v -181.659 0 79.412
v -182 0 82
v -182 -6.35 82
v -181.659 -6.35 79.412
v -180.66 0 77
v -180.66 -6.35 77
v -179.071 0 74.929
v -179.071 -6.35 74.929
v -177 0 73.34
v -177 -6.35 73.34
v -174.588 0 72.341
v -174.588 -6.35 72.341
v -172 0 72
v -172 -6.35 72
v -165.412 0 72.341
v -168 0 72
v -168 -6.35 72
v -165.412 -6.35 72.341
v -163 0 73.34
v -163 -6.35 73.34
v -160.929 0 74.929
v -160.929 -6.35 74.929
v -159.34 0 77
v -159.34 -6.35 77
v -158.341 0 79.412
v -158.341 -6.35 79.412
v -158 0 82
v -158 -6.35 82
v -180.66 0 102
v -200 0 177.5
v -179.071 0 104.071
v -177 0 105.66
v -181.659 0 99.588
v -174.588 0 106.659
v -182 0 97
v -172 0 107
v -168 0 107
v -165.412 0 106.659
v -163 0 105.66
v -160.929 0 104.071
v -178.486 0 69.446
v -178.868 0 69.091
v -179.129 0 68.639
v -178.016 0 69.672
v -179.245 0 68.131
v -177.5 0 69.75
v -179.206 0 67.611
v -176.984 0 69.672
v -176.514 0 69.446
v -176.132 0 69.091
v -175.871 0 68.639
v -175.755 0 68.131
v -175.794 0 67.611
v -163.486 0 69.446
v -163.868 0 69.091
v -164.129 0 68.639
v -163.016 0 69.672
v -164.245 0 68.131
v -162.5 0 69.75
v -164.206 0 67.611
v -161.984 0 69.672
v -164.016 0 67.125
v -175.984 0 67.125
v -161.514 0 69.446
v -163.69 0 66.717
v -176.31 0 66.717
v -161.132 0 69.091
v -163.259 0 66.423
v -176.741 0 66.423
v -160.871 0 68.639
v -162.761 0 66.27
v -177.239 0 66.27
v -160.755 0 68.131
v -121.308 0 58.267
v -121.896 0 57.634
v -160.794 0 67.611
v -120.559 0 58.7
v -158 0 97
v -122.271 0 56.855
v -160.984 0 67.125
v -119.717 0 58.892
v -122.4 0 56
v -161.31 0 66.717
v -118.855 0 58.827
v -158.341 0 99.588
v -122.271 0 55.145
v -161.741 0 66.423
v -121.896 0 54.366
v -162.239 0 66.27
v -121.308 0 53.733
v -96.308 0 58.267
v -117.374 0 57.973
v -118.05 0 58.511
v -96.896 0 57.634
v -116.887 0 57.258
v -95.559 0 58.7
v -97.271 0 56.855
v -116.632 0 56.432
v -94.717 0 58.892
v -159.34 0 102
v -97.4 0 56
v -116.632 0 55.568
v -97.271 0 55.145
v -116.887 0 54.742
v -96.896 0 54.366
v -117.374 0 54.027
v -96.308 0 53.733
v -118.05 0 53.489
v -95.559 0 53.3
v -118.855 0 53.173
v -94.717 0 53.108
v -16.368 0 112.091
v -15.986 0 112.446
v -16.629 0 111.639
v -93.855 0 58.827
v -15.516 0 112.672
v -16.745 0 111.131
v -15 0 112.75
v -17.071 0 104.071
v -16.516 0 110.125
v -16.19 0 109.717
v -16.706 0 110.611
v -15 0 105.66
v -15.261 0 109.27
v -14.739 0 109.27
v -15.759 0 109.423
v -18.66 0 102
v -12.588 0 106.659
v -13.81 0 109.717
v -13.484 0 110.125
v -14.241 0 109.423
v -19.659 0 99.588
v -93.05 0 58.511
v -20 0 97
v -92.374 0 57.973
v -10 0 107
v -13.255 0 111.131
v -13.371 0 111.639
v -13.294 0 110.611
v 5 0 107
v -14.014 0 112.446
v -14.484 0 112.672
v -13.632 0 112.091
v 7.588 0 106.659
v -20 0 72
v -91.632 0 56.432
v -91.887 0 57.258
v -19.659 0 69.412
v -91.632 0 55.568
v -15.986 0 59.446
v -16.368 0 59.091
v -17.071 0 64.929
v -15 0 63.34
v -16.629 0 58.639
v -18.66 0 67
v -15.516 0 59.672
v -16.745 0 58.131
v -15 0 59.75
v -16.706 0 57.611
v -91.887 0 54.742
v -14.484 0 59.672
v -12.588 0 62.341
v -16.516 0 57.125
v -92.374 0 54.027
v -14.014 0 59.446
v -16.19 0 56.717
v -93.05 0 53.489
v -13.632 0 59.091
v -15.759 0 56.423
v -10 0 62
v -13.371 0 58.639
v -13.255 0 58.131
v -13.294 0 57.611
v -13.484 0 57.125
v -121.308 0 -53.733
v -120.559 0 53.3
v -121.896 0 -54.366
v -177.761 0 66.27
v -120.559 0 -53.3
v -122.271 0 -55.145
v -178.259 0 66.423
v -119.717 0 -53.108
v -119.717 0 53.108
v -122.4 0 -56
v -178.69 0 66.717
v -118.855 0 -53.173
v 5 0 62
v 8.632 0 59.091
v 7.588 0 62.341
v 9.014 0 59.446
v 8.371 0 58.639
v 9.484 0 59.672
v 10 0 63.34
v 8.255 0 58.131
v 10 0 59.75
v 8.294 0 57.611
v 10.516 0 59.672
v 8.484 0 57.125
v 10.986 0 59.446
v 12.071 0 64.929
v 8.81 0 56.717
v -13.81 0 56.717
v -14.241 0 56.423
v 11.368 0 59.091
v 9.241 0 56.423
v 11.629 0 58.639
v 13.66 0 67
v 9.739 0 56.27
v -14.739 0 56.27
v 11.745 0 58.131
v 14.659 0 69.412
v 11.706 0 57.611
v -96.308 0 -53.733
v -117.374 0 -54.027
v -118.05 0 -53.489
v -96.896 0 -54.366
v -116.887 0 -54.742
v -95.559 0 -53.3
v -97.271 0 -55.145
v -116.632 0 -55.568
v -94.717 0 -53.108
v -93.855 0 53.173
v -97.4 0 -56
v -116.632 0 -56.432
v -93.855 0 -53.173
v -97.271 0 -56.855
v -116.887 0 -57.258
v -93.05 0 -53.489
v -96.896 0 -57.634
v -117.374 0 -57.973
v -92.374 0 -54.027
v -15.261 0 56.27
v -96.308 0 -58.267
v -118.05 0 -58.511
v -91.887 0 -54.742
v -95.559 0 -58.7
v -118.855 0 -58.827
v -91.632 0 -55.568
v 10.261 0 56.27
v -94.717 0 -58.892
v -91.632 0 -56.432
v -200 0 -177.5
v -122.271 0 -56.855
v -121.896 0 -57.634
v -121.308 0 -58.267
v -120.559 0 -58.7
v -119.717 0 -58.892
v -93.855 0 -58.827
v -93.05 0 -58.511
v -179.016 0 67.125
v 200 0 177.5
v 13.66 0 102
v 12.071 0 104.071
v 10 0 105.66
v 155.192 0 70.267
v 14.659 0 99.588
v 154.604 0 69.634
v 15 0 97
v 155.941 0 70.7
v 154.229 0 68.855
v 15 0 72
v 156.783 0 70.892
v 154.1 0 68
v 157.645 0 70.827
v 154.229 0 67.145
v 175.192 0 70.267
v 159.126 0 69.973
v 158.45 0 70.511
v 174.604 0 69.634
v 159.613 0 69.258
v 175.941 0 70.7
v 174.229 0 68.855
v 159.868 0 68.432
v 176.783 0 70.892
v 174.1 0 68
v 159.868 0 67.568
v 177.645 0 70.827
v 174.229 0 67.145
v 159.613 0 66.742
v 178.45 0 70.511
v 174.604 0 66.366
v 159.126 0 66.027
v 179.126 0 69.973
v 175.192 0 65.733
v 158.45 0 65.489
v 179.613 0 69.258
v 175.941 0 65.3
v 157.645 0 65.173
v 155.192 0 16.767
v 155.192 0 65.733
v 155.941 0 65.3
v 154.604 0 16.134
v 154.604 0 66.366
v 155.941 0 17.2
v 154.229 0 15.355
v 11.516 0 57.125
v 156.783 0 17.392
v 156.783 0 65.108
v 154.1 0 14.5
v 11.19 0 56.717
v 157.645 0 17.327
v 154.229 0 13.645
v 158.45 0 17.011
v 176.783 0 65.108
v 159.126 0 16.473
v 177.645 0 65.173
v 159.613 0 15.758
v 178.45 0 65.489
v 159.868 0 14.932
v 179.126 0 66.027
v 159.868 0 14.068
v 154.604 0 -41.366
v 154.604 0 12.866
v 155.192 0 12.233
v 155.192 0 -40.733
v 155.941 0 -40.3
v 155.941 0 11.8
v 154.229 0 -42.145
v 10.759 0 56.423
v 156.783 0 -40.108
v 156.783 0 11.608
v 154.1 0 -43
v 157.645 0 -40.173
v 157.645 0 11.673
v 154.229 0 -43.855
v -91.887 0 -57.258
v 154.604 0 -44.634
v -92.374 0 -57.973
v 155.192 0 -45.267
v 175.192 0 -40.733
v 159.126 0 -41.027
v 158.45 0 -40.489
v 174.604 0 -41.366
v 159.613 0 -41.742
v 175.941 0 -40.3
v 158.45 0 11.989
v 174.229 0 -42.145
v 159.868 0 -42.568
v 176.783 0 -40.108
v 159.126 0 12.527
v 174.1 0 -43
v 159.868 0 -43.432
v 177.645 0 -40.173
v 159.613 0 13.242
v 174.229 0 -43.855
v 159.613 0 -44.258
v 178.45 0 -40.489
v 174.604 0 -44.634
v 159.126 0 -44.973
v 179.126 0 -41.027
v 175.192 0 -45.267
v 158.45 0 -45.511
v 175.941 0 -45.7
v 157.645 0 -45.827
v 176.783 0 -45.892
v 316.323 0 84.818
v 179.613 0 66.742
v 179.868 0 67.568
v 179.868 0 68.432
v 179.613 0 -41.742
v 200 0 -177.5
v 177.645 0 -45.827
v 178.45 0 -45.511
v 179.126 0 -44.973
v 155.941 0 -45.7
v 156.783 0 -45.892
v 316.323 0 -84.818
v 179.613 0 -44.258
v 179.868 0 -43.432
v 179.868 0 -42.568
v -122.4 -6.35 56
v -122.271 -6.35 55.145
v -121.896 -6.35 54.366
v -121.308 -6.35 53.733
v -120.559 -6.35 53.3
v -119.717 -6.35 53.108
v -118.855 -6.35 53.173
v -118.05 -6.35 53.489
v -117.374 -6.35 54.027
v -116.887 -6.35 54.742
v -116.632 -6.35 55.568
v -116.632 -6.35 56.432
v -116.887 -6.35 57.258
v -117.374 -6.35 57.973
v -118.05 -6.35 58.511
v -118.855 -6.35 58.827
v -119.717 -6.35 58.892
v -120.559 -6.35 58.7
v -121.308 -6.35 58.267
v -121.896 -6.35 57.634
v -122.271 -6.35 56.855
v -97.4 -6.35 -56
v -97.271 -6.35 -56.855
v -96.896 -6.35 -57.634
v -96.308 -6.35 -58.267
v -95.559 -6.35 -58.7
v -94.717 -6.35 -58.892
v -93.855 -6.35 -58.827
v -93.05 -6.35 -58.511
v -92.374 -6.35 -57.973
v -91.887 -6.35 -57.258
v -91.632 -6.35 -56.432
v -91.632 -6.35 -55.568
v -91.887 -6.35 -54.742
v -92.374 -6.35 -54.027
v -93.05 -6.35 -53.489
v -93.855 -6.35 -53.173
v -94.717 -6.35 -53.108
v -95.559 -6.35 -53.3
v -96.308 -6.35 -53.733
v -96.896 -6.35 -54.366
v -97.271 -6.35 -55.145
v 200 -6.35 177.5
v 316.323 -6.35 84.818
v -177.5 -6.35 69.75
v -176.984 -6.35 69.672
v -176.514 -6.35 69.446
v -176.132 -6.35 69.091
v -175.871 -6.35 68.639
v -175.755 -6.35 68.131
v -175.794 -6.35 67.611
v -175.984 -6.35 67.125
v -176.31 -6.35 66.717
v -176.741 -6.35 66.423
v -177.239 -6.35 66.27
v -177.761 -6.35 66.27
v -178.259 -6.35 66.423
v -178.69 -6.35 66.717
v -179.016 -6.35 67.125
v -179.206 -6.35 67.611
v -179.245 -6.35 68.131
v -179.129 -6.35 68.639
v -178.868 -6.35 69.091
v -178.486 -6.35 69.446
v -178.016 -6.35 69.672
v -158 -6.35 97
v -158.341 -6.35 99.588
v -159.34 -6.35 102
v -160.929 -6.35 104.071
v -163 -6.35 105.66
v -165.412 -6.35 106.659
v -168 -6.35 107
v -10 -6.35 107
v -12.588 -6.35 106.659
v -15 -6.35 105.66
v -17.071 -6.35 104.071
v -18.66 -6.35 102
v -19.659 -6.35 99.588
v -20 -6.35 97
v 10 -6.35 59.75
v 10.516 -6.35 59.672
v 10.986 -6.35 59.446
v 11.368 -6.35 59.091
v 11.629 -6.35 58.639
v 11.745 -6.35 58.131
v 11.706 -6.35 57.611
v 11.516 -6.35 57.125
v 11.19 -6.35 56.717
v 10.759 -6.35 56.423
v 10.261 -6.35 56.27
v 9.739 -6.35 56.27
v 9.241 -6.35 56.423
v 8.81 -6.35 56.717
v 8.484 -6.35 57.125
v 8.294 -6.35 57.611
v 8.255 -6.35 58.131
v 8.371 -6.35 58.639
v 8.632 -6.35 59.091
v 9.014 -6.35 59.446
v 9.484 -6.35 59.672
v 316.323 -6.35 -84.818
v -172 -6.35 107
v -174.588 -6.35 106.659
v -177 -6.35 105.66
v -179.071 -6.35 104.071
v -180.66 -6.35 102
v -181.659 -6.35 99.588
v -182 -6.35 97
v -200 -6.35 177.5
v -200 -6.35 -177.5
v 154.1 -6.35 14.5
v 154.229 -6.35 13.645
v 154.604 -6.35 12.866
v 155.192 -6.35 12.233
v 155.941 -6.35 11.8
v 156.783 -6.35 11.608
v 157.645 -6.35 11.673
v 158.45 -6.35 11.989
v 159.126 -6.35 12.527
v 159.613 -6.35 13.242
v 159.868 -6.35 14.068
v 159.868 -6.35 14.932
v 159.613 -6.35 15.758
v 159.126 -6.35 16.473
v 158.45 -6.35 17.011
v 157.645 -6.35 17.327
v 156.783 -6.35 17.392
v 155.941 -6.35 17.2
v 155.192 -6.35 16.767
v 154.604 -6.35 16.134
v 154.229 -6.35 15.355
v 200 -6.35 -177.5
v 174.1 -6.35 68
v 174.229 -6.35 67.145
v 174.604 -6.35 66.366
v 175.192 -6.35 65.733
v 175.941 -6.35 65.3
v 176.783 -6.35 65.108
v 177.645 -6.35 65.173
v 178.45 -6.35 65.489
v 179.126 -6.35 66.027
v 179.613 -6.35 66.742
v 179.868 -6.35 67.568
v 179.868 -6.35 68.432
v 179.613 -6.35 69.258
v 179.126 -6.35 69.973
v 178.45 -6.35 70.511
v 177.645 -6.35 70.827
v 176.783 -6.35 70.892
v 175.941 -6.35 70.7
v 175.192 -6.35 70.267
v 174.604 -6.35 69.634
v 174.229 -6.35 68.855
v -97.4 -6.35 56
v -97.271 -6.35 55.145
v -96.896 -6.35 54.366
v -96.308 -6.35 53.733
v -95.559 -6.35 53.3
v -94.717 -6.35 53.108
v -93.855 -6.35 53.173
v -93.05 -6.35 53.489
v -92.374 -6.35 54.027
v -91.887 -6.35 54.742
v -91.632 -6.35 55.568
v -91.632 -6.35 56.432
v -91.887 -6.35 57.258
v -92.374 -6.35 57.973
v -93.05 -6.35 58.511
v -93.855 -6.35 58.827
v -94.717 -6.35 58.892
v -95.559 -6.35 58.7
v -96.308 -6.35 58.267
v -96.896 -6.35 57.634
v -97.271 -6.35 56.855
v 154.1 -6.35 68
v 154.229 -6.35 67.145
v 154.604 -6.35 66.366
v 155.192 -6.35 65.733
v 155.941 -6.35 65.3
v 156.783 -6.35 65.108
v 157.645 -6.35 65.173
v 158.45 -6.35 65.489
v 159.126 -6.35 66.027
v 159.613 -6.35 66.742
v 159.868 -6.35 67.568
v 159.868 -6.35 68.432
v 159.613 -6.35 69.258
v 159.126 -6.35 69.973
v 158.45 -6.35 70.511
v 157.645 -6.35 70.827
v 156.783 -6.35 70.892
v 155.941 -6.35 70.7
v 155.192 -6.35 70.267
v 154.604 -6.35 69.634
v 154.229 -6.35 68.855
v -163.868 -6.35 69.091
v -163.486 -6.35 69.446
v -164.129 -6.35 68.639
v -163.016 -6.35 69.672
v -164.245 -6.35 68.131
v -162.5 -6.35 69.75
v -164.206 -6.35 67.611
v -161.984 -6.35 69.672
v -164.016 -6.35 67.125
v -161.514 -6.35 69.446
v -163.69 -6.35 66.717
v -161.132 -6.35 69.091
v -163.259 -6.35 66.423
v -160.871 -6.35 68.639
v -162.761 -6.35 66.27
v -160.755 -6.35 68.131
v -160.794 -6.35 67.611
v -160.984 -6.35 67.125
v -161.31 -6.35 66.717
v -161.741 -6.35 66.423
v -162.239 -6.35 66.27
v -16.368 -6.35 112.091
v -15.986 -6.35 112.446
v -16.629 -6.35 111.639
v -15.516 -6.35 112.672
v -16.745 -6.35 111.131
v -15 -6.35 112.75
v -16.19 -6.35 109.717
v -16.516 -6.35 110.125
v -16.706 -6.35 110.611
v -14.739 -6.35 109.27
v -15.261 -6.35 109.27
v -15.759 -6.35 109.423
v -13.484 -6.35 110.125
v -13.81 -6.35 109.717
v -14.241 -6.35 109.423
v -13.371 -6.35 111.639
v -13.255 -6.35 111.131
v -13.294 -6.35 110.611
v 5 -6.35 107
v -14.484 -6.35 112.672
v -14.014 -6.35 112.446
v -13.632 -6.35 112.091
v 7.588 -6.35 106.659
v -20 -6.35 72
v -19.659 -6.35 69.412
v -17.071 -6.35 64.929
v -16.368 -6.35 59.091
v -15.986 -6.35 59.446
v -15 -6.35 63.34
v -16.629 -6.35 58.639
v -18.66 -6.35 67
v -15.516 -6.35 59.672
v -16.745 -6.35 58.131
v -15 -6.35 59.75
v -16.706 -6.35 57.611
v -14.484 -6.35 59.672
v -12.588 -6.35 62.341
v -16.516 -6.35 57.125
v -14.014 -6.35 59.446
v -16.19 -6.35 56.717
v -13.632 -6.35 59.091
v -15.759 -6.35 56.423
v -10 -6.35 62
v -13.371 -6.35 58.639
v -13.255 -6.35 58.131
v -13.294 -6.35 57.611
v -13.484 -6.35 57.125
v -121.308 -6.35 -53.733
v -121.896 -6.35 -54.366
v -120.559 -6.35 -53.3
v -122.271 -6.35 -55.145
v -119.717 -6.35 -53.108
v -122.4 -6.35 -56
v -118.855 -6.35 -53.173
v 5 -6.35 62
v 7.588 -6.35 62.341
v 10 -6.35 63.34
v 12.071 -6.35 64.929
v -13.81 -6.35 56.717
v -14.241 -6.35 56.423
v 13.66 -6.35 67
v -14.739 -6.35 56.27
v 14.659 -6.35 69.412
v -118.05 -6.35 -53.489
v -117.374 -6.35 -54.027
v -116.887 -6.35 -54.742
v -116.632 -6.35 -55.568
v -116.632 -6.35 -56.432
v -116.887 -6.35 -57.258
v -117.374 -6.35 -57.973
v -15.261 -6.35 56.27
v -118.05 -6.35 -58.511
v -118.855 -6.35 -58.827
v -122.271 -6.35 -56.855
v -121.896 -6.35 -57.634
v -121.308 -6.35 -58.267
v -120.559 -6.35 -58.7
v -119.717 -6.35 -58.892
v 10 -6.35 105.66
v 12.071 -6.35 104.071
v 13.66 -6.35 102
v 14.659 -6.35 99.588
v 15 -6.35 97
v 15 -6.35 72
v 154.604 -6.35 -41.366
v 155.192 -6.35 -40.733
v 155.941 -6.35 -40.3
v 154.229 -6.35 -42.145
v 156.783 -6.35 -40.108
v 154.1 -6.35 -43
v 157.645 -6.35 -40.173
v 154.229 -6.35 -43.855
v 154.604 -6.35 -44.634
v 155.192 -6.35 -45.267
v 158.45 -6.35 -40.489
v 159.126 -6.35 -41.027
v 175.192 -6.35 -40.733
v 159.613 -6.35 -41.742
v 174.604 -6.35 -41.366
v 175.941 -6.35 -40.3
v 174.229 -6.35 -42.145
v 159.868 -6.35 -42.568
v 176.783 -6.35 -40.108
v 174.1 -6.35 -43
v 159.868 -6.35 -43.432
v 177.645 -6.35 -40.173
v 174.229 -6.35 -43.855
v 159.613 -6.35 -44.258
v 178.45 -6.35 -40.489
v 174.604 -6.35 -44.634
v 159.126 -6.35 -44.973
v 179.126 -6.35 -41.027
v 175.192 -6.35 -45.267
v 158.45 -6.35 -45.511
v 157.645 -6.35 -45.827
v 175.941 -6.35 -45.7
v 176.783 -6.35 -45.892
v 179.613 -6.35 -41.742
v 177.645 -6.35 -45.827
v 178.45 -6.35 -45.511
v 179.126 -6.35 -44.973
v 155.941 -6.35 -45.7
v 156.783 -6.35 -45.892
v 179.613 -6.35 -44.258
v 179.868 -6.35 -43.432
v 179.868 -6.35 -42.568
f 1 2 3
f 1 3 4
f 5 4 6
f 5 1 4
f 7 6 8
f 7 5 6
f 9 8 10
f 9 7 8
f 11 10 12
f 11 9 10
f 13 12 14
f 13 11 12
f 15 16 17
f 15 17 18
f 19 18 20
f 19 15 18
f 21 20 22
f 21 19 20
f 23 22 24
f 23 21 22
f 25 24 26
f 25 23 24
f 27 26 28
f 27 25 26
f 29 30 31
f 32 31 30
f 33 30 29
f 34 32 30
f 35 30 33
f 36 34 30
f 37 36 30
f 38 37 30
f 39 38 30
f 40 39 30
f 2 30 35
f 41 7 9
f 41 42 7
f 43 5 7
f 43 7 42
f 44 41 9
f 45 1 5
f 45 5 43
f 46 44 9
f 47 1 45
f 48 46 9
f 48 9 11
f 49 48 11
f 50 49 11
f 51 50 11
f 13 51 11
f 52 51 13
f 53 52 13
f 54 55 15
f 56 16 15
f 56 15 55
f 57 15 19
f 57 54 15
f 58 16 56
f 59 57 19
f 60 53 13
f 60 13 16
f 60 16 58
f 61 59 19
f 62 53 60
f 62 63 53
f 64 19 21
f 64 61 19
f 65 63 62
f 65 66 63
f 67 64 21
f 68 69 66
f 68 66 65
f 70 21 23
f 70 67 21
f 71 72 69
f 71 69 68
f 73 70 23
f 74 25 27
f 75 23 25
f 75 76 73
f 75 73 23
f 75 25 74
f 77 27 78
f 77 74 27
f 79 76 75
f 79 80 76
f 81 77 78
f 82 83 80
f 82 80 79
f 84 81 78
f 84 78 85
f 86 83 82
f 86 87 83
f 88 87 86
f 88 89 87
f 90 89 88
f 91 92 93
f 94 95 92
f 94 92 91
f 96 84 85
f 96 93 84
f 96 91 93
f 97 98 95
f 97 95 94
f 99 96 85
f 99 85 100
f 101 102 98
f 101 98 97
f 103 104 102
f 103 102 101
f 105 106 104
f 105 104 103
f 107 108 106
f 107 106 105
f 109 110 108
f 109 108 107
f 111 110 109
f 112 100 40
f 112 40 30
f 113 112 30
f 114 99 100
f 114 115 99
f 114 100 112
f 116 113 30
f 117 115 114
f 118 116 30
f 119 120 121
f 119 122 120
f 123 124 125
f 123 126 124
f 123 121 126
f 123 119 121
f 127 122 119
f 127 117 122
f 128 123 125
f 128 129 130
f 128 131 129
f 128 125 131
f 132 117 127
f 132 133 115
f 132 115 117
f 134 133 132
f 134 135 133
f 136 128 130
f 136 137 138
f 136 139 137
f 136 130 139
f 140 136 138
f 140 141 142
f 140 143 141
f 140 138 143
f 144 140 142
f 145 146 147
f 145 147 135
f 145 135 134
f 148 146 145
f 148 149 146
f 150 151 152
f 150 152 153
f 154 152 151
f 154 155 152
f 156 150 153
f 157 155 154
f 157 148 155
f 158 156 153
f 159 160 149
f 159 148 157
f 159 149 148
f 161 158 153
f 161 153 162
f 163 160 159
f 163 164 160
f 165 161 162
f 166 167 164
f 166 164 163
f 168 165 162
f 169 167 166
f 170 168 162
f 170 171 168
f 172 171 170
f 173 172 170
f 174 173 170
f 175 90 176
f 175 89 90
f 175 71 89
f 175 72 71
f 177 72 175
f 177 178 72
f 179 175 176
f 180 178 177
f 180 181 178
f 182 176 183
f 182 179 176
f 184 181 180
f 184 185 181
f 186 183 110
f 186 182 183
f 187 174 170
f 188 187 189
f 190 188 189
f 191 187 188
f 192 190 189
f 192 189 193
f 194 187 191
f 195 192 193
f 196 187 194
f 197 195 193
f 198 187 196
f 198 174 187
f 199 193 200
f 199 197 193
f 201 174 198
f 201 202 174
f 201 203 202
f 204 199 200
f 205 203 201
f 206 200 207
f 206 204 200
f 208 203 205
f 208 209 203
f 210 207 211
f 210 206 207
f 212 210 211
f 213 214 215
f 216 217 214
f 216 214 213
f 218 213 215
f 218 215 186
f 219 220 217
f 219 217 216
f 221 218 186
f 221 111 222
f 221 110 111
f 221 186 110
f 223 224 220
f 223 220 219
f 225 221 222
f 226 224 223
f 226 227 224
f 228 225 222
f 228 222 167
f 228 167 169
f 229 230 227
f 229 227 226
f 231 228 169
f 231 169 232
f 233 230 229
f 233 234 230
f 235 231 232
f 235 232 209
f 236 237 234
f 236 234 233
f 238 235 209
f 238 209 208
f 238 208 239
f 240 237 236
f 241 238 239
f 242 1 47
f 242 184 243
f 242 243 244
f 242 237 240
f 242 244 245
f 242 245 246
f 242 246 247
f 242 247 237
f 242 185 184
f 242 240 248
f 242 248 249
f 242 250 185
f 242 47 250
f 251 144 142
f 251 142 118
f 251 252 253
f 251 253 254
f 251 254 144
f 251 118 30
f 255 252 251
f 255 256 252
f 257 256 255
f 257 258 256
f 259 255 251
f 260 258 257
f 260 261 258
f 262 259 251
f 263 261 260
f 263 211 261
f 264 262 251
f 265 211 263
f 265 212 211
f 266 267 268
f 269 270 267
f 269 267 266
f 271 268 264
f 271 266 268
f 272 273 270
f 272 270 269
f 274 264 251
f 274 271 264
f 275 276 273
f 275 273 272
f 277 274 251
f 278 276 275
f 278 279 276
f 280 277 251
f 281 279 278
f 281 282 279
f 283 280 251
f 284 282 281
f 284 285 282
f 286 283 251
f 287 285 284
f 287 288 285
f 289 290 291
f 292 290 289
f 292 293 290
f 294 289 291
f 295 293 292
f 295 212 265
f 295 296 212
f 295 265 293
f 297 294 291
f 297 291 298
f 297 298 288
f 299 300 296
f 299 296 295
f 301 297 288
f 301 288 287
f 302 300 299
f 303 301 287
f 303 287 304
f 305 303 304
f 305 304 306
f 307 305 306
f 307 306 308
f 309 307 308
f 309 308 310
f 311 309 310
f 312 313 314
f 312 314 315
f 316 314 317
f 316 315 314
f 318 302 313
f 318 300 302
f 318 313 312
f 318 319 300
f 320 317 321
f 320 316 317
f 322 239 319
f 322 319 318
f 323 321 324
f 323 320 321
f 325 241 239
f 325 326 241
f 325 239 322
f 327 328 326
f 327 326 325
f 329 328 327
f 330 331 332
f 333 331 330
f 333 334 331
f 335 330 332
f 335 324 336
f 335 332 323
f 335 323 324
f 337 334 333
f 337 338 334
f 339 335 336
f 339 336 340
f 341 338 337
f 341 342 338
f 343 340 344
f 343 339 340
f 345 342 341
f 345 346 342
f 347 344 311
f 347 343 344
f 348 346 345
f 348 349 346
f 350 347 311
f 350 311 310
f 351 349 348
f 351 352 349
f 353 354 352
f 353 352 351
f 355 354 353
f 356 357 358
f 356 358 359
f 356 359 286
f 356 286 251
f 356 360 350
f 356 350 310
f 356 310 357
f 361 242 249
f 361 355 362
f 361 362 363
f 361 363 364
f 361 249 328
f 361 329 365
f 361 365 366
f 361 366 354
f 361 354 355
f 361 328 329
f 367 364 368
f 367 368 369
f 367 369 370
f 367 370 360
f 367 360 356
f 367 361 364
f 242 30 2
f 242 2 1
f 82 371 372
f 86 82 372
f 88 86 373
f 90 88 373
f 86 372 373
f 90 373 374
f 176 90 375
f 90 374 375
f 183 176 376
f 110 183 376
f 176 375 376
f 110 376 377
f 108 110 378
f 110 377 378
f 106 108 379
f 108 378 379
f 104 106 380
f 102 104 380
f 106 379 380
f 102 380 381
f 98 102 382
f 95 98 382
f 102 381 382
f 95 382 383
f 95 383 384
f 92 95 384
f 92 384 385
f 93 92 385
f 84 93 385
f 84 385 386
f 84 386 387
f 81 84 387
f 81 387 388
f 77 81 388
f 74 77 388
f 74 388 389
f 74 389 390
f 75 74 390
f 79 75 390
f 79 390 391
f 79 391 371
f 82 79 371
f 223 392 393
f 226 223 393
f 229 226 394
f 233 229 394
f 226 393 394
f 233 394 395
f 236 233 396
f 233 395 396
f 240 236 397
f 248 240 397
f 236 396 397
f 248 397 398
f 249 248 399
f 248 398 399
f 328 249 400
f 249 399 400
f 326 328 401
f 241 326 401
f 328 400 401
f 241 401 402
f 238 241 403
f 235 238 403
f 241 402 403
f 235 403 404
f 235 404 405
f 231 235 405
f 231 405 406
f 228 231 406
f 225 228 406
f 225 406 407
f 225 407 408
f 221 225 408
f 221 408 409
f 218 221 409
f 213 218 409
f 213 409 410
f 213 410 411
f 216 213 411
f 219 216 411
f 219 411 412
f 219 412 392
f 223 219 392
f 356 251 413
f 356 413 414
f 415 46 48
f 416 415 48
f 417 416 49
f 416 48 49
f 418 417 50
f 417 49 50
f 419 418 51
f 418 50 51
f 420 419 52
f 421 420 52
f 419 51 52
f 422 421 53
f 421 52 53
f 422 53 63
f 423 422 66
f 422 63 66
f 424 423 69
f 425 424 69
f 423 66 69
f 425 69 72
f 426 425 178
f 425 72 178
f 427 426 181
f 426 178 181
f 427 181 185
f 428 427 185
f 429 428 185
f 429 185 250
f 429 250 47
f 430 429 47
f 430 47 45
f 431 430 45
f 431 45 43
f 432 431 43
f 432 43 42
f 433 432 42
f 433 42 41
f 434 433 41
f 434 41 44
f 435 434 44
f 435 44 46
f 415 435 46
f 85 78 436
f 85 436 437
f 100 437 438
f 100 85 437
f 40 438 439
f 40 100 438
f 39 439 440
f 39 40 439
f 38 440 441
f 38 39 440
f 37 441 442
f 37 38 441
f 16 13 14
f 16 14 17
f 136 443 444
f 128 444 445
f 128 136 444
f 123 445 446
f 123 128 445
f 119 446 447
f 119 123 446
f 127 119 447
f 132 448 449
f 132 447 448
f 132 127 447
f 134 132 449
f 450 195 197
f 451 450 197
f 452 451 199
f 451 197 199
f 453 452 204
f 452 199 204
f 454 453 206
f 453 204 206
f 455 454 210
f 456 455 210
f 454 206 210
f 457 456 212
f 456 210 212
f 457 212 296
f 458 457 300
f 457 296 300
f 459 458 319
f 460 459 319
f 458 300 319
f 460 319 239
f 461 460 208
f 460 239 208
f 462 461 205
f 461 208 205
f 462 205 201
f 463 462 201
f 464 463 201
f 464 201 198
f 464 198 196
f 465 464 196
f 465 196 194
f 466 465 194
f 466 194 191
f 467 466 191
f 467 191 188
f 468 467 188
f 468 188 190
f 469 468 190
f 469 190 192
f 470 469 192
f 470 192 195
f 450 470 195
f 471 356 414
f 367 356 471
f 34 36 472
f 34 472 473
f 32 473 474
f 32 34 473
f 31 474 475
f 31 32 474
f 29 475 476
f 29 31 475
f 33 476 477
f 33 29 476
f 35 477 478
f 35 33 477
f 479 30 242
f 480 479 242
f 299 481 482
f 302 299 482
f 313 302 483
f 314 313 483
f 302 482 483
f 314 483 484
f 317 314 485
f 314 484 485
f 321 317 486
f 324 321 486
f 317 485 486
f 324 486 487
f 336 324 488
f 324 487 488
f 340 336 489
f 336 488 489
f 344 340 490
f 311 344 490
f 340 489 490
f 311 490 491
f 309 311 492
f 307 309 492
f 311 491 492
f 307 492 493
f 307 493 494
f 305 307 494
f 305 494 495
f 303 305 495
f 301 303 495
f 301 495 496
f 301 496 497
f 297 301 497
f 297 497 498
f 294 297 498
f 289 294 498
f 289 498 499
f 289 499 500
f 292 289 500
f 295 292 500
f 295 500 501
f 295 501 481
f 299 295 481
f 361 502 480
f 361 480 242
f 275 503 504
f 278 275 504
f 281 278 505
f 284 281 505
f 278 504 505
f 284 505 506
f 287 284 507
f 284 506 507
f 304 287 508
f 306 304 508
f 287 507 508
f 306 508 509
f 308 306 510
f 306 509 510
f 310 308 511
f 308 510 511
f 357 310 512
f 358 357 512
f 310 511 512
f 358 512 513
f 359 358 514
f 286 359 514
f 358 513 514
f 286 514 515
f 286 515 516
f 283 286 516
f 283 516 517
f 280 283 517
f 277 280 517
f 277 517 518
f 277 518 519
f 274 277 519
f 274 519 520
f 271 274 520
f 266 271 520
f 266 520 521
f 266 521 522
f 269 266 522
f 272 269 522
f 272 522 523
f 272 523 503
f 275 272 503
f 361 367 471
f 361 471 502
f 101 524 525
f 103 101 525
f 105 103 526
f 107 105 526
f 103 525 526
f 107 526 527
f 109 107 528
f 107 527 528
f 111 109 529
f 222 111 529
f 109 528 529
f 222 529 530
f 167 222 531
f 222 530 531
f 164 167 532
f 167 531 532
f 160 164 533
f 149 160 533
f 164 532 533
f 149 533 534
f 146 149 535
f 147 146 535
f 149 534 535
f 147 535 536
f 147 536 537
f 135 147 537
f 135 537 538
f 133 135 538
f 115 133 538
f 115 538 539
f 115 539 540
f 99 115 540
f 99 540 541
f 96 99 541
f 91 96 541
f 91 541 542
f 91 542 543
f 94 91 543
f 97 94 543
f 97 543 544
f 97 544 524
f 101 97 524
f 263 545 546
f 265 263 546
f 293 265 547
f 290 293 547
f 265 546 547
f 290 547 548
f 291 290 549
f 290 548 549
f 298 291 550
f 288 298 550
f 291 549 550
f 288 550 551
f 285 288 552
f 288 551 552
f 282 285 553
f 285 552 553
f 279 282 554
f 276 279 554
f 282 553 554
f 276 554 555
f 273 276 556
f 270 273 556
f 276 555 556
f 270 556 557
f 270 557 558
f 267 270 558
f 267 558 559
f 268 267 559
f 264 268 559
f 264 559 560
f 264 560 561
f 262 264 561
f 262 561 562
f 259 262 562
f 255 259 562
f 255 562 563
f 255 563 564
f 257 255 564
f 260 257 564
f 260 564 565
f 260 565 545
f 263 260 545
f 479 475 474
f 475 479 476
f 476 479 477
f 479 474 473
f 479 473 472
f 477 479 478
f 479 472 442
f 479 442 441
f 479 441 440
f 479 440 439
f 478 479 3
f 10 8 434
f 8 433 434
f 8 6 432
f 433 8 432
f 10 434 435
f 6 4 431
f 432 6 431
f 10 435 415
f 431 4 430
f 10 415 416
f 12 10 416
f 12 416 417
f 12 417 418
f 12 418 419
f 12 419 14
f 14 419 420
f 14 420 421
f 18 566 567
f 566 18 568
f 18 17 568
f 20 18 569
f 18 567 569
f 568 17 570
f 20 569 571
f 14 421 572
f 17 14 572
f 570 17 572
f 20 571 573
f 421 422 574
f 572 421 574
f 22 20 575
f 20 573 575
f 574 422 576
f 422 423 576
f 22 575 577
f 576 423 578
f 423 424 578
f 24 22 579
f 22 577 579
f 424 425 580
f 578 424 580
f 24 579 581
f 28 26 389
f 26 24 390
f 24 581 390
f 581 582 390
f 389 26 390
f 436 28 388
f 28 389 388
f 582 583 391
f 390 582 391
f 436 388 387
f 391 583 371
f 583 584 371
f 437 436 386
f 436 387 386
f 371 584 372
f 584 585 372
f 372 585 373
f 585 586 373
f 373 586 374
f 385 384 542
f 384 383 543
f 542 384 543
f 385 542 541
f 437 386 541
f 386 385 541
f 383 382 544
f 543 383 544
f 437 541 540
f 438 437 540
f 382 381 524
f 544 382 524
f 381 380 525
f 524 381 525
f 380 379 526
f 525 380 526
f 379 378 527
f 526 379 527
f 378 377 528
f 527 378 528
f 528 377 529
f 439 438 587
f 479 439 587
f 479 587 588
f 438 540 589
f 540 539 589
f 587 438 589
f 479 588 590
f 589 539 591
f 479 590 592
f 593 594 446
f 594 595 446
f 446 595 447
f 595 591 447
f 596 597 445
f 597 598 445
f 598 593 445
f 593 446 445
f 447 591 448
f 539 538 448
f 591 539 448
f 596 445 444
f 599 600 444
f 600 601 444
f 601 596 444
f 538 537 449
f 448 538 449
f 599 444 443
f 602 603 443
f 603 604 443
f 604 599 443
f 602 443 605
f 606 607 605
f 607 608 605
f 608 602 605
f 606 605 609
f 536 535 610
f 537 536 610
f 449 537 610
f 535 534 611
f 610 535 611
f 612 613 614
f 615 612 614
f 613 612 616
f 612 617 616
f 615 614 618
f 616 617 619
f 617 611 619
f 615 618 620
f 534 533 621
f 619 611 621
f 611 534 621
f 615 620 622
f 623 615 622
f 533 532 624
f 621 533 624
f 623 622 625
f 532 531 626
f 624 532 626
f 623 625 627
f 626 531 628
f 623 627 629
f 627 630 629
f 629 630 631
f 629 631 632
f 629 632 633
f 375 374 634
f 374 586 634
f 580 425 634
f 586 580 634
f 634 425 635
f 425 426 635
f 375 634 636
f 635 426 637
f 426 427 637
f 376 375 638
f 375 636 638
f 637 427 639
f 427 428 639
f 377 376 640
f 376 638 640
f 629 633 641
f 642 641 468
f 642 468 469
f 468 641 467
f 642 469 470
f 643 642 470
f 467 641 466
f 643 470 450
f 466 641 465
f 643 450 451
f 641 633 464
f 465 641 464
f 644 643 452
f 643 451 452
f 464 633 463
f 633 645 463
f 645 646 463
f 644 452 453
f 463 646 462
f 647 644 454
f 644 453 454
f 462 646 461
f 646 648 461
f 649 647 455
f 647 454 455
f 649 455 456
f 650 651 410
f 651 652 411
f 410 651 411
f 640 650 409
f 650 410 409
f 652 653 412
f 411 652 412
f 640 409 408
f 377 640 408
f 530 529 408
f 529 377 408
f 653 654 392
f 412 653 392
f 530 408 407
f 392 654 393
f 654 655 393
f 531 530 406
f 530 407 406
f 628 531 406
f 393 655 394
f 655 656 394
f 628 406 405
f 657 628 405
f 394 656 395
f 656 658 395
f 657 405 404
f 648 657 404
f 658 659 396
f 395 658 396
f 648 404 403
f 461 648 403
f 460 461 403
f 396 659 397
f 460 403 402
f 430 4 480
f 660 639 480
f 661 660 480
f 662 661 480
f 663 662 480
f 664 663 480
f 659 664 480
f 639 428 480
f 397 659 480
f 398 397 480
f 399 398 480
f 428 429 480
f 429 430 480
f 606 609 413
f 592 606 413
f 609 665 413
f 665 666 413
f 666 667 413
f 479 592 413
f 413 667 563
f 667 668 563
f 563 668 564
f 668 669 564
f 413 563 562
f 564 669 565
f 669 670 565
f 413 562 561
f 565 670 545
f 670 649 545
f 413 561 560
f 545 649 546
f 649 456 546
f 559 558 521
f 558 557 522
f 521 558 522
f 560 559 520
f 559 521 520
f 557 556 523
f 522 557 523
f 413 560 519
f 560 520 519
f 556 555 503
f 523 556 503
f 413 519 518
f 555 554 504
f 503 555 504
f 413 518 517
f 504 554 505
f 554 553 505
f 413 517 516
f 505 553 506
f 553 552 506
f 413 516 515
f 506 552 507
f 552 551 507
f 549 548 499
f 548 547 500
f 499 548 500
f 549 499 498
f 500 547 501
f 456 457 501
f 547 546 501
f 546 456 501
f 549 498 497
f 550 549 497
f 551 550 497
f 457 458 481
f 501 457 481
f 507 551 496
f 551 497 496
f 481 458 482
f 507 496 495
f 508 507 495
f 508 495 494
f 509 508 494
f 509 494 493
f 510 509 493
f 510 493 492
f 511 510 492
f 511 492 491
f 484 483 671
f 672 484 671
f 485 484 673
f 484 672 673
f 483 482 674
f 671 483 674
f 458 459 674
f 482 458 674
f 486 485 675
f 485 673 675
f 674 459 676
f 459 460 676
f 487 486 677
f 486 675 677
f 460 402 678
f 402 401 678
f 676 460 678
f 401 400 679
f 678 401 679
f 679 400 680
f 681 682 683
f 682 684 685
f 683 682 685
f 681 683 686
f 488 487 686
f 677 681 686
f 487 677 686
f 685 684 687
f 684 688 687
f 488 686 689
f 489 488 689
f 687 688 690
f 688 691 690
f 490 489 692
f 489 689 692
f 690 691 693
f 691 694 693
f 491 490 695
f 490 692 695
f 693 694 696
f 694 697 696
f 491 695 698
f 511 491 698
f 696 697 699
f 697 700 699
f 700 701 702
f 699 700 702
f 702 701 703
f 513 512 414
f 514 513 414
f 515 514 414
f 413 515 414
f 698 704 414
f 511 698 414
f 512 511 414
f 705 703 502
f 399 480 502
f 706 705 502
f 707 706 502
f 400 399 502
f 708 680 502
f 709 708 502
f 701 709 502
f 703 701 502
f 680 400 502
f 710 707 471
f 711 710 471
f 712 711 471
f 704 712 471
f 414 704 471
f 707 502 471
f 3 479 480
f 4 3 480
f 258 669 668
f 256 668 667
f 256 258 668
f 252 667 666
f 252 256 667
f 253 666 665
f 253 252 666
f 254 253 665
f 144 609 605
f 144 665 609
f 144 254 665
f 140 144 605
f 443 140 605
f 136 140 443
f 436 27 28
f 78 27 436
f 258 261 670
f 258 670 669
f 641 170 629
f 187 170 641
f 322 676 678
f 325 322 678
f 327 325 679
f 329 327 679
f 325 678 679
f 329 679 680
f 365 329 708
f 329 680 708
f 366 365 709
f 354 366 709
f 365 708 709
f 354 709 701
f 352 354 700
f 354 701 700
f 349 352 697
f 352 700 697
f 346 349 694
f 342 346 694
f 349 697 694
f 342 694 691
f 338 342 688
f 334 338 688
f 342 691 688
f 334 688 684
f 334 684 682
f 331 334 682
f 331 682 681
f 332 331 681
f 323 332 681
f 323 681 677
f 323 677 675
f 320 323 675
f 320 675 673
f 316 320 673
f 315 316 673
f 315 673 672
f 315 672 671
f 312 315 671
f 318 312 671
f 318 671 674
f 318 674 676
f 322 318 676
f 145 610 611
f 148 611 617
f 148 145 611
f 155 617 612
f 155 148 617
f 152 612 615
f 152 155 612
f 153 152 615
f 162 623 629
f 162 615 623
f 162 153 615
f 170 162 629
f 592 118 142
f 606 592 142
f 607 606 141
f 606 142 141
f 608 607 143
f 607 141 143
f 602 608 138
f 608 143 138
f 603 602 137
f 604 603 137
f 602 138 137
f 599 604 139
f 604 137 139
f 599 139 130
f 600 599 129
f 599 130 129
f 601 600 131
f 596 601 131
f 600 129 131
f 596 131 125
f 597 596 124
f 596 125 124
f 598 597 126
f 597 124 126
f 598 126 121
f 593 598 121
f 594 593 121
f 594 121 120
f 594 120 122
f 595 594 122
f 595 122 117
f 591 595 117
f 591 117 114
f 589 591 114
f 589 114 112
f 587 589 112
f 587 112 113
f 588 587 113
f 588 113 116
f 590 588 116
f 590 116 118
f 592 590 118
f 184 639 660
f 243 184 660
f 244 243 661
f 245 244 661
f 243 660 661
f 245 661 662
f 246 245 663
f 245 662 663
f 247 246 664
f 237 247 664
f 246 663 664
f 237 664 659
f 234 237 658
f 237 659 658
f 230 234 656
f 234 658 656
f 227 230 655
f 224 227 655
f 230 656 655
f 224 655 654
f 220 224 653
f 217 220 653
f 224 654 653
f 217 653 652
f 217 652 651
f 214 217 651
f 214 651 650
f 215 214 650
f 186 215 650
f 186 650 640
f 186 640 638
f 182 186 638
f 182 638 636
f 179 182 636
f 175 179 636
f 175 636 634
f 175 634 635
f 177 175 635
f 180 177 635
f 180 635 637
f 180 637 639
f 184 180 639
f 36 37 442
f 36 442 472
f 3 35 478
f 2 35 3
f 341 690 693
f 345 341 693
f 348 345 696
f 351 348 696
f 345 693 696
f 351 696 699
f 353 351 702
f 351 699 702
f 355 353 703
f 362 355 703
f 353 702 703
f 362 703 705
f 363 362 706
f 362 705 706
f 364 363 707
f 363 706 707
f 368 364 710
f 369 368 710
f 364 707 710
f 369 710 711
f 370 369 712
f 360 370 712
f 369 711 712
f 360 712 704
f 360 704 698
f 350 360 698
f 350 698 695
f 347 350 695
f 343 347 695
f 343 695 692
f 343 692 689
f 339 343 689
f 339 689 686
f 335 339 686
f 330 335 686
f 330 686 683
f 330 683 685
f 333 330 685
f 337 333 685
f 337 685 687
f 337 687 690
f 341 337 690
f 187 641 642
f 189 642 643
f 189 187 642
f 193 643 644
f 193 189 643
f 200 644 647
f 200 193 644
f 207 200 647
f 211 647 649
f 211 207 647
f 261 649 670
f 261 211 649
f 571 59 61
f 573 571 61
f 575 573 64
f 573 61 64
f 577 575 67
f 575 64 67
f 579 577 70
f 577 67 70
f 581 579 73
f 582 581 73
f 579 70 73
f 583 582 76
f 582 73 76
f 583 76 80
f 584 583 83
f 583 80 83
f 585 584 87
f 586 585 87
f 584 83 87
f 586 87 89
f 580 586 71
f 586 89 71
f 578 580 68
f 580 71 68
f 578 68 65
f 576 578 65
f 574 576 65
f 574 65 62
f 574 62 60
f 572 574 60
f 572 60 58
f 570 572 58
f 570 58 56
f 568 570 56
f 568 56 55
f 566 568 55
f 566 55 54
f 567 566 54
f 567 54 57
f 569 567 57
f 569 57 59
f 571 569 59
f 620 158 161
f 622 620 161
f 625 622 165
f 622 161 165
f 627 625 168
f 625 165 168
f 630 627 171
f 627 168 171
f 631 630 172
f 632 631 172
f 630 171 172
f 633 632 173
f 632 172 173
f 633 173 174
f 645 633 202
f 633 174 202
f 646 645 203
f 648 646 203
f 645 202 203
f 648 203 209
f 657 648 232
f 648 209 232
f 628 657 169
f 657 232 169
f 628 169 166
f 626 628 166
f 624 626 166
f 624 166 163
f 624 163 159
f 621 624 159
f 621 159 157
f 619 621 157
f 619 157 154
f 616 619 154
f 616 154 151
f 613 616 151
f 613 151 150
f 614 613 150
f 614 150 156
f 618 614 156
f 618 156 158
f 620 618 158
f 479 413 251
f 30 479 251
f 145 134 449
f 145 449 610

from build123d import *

# Parameters (mm, degrees)
SKETCH1_W            = 355
SKETCH1_H            = 6.35
BOSS_EXTRUDE1_DEPTH  = 200
SKETCH28_R           = 1.75
RELIEF_CUTS_DEPTH    = 10
M5_CLEARANCE_HOLE1_D = 5.8
BOSS_EXTRUDE2_DEPTH  = 6.35


with BuildPart() as part:
    # Sketch1 → Boss-Extrude1 (new, symmetric)
    with BuildSketch(Plane(origin=(0, 0, 0), x_dir=(0, 0, -1), z_dir=(1, 0, 0))):
        with Locations((0, -3.175)):
            Rectangle(SKETCH1_W, SKETCH1_H)
    extrude(amount=BOSS_EXTRUDE1_DEPTH, both=True)

    # Sketch28 → Relief Cuts (cut)
    with BuildSketch(Plane(origin=(0, 0, 0), x_dir=(-1, 0, 0), z_dir=(0, 1, 0))):
        with Locations(Location((15, 111, 0), (0, 0, 90))):
            Circle(SKETCH28_R)
        with Locations(Location((15, 58, 0), (0, 0, 90))):
            Circle(SKETCH28_R)
        with Locations(Location((-10, 58, 0), (0, 0, 90))):
            Circle(SKETCH28_R)
        with Locations(Location((162.5, 68, 0), (0, 0, 90))):
            Circle(SKETCH28_R)
        with Locations(Location((177.5, 68, 0), (0, 0, 90))):
            Circle(SKETCH28_R)
        with BuildLine():
            Line((10, 62), (-5, 62))
            ThreePointArc((-5, 62), (-12.071067812, 64.928932188), (-15, 72))
            Line((-15, 72), (-15, 97))
            ThreePointArc((-15, 97), (-12.071067812, 104.071067812), (-5, 107))
            Line((-5, 107), (10, 107))
            ThreePointArc((10, 107), (17.071067812, 104.071067812), (20, 97))
            Line((20, 97), (20, 72))
            ThreePointArc((20, 72), (17.071067812, 64.928932188), (10, 62))
        make_face()
        with BuildLine():
            Line((168, 107), (172, 107))
            ThreePointArc((172, 107), (179.071067812, 104.071067812), (182, 97))
            Line((182, 97), (182, 82))
            ThreePointArc((182, 82), (179.071067812, 74.928932188), (172, 72))
            Line((172, 72), (168, 72))
            ThreePointArc((168, 72), (160.928932188, 74.928932188), (158, 82))
            Line((158, 82), (158, 97))
            ThreePointArc((158, 97), (160.928932188, 104.071067812), (168, 107))
        make_face()
    extrude(amount=-RELIEF_CUTS_DEPTH, mode=Mode.SUBTRACT)

    # M5 Clearance Hole1 (through all)
    with Locations(Plane(origin=(0, 0, 0), x_dir=(1, 0, 0), z_dir=(0, 1, 0))):
        with Locations((-119.5, 56), (-94.5, 56), (-94.5, -56), (-119.5, -56), (157, -68), (157, -14.5), (157, 43), (177, 43), (177, -68)):
            Hole(M5_CLEARANCE_HOLE1_D / 2)

    # Sketch33 → Boss-Extrude2 (add)
    with BuildSketch(Plane(origin=(0, 0, 0), x_dir=(1, 0, 0), z_dir=(0, 1, 0))):
        Polygon((200, 177.5), (200, -177.5), (316.322865072, -84.817675973), (316.322865072, 84.817675973), align=None)
    extrude(amount=-BOSS_EXTRUDE2_DEPTH)


solid = part.part
